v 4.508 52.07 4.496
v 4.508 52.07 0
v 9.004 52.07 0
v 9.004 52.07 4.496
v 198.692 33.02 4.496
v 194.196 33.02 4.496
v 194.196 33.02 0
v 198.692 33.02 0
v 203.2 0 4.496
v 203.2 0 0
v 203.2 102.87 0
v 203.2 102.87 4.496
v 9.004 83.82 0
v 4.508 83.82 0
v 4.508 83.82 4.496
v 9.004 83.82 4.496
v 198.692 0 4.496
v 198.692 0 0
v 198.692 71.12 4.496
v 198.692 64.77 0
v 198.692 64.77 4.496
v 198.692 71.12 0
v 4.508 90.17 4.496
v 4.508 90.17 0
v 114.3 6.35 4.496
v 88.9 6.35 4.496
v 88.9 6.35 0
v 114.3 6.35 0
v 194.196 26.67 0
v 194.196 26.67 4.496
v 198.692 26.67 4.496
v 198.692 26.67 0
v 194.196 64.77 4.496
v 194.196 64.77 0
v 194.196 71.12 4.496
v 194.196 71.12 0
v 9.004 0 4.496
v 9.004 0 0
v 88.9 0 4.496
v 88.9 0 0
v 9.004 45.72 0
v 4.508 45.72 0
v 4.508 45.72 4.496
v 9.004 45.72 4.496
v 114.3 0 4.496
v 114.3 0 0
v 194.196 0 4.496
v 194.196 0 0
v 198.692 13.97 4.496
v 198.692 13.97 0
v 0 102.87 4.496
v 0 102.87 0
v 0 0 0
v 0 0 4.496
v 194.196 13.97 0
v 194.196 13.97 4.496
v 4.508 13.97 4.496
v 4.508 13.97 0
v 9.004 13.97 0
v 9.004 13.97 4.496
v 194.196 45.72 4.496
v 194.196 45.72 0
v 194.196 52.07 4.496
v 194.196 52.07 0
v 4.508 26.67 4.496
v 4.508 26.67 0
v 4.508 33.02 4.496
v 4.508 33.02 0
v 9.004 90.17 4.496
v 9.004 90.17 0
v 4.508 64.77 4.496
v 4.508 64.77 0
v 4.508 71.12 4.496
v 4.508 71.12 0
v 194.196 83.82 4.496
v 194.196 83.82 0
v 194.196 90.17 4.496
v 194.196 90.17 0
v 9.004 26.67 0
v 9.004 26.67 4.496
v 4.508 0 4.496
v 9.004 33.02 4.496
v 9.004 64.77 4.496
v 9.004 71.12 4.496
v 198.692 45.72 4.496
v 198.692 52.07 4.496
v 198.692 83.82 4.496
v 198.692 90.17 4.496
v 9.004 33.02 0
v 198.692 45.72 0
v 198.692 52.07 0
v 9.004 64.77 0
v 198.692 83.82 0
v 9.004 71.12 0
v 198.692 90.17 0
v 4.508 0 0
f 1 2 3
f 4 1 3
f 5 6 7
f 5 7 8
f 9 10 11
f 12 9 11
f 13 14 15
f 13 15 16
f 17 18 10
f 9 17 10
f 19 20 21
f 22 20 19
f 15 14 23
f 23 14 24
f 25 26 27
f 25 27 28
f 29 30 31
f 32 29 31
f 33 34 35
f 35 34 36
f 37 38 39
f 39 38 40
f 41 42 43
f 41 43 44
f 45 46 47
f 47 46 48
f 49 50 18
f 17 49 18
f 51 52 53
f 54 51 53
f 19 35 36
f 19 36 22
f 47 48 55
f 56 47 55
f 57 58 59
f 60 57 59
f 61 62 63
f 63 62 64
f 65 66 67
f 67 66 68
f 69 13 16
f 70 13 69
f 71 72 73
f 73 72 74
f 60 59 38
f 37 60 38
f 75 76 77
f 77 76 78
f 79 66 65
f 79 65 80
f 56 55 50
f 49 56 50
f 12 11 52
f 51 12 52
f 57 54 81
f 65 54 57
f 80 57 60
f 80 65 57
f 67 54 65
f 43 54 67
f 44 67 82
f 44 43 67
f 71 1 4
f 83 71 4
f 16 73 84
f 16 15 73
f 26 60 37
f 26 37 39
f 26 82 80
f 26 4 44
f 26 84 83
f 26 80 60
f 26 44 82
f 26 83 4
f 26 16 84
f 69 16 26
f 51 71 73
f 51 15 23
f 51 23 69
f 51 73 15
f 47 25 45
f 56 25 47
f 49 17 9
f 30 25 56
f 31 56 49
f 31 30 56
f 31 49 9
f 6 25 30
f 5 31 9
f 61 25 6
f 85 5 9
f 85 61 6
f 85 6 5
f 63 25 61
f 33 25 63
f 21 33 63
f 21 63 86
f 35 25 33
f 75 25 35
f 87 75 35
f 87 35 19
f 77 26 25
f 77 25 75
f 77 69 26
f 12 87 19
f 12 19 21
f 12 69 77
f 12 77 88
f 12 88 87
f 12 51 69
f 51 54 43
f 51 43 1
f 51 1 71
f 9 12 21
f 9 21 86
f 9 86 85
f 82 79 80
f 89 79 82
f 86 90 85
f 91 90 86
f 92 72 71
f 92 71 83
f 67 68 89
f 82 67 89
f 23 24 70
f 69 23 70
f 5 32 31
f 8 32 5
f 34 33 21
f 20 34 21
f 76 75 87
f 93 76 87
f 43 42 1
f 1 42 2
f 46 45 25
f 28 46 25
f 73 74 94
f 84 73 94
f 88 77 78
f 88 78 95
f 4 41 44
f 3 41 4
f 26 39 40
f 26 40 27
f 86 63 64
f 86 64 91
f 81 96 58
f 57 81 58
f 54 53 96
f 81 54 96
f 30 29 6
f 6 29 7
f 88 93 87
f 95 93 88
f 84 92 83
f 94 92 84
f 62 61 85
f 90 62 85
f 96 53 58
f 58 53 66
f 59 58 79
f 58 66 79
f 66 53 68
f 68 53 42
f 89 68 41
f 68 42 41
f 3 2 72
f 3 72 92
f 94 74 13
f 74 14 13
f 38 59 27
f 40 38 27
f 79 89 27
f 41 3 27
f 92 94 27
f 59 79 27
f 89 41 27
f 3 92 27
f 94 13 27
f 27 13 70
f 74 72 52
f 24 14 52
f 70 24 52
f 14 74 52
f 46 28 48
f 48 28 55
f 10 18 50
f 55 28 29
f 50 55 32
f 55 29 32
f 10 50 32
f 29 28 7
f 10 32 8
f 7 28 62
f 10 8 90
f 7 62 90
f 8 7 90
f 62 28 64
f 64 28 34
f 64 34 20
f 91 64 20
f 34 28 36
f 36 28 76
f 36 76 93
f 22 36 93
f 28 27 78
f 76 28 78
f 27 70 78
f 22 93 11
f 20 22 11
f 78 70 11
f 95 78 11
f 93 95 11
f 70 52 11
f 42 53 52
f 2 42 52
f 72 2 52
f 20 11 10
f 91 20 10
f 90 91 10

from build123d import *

# Parameters (mm, degrees)
SKETCH1_W           = 4.4958
SKETCH1_H           = 6.35
BOSS_EXTRUDE1_DEPTH = 4.4958
SKETCH2_W           = 25.4
SKETCH2_H           = 6.35
CUT_EXTRUDE1_DEPTH  = 228.799668827


with BuildPart() as part:
    # Sketch1 → Boss-Extrude1 (new body)
    with BuildSketch(Plane.XY):
        Polygon((0, 102.87), (0, 0), (4.5085, 0), (4.5085, 7.62), (4.5085, 13.97), (9.0043, 13.97), (9.0043, 7.62), (9.0043, 0), (194.1957, 0), (194.1957, 7.62), (194.1957, 13.97), (198.6915, 13.97), (198.6915, 7.62), (198.6915, 0), (203.2, 0), (203.2, 102.87), align=None)
        with Locations((6.7564, 29.845)):
            Rectangle(SKETCH1_W, SKETCH1_H, mode=Mode.SUBTRACT)
        with Locations((6.7564, 48.895)):
            Rectangle(SKETCH1_W, SKETCH1_H, mode=Mode.SUBTRACT)
        with Locations((196.4436, 29.845)):
            Rectangle(SKETCH1_W, SKETCH1_H, mode=Mode.SUBTRACT)
        with Locations((196.4436, 48.895)):
            Rectangle(SKETCH1_W, SKETCH1_H, mode=Mode.SUBTRACT)
        with Locations((6.7564, 67.945)):
            Rectangle(SKETCH1_W, SKETCH1_H, mode=Mode.SUBTRACT)
        with Locations((6.7564, 86.995)):
            Rectangle(SKETCH1_W, SKETCH1_H, mode=Mode.SUBTRACT)
        with Locations((196.4436, 67.945)):
            Rectangle(SKETCH1_W, SKETCH1_H, mode=Mode.SUBTRACT)
        with Locations((196.4436, 86.995)):
            Rectangle(SKETCH1_W, SKETCH1_H, mode=Mode.SUBTRACT)
    extrude(amount=BOSS_EXTRUDE1_DEPTH)

    # Sketch2 → Cut-Extrude1 (cut, through all)
    with BuildSketch(Plane.XY.offset(4.4958)):
        with Locations((101.6, 3.175)):
            Rectangle(SKETCH2_W, SKETCH2_H)
    extrude(amount=-CUT_EXTRUDE1_DEPTH, mode=Mode.SUBTRACT)


solid = part.part
